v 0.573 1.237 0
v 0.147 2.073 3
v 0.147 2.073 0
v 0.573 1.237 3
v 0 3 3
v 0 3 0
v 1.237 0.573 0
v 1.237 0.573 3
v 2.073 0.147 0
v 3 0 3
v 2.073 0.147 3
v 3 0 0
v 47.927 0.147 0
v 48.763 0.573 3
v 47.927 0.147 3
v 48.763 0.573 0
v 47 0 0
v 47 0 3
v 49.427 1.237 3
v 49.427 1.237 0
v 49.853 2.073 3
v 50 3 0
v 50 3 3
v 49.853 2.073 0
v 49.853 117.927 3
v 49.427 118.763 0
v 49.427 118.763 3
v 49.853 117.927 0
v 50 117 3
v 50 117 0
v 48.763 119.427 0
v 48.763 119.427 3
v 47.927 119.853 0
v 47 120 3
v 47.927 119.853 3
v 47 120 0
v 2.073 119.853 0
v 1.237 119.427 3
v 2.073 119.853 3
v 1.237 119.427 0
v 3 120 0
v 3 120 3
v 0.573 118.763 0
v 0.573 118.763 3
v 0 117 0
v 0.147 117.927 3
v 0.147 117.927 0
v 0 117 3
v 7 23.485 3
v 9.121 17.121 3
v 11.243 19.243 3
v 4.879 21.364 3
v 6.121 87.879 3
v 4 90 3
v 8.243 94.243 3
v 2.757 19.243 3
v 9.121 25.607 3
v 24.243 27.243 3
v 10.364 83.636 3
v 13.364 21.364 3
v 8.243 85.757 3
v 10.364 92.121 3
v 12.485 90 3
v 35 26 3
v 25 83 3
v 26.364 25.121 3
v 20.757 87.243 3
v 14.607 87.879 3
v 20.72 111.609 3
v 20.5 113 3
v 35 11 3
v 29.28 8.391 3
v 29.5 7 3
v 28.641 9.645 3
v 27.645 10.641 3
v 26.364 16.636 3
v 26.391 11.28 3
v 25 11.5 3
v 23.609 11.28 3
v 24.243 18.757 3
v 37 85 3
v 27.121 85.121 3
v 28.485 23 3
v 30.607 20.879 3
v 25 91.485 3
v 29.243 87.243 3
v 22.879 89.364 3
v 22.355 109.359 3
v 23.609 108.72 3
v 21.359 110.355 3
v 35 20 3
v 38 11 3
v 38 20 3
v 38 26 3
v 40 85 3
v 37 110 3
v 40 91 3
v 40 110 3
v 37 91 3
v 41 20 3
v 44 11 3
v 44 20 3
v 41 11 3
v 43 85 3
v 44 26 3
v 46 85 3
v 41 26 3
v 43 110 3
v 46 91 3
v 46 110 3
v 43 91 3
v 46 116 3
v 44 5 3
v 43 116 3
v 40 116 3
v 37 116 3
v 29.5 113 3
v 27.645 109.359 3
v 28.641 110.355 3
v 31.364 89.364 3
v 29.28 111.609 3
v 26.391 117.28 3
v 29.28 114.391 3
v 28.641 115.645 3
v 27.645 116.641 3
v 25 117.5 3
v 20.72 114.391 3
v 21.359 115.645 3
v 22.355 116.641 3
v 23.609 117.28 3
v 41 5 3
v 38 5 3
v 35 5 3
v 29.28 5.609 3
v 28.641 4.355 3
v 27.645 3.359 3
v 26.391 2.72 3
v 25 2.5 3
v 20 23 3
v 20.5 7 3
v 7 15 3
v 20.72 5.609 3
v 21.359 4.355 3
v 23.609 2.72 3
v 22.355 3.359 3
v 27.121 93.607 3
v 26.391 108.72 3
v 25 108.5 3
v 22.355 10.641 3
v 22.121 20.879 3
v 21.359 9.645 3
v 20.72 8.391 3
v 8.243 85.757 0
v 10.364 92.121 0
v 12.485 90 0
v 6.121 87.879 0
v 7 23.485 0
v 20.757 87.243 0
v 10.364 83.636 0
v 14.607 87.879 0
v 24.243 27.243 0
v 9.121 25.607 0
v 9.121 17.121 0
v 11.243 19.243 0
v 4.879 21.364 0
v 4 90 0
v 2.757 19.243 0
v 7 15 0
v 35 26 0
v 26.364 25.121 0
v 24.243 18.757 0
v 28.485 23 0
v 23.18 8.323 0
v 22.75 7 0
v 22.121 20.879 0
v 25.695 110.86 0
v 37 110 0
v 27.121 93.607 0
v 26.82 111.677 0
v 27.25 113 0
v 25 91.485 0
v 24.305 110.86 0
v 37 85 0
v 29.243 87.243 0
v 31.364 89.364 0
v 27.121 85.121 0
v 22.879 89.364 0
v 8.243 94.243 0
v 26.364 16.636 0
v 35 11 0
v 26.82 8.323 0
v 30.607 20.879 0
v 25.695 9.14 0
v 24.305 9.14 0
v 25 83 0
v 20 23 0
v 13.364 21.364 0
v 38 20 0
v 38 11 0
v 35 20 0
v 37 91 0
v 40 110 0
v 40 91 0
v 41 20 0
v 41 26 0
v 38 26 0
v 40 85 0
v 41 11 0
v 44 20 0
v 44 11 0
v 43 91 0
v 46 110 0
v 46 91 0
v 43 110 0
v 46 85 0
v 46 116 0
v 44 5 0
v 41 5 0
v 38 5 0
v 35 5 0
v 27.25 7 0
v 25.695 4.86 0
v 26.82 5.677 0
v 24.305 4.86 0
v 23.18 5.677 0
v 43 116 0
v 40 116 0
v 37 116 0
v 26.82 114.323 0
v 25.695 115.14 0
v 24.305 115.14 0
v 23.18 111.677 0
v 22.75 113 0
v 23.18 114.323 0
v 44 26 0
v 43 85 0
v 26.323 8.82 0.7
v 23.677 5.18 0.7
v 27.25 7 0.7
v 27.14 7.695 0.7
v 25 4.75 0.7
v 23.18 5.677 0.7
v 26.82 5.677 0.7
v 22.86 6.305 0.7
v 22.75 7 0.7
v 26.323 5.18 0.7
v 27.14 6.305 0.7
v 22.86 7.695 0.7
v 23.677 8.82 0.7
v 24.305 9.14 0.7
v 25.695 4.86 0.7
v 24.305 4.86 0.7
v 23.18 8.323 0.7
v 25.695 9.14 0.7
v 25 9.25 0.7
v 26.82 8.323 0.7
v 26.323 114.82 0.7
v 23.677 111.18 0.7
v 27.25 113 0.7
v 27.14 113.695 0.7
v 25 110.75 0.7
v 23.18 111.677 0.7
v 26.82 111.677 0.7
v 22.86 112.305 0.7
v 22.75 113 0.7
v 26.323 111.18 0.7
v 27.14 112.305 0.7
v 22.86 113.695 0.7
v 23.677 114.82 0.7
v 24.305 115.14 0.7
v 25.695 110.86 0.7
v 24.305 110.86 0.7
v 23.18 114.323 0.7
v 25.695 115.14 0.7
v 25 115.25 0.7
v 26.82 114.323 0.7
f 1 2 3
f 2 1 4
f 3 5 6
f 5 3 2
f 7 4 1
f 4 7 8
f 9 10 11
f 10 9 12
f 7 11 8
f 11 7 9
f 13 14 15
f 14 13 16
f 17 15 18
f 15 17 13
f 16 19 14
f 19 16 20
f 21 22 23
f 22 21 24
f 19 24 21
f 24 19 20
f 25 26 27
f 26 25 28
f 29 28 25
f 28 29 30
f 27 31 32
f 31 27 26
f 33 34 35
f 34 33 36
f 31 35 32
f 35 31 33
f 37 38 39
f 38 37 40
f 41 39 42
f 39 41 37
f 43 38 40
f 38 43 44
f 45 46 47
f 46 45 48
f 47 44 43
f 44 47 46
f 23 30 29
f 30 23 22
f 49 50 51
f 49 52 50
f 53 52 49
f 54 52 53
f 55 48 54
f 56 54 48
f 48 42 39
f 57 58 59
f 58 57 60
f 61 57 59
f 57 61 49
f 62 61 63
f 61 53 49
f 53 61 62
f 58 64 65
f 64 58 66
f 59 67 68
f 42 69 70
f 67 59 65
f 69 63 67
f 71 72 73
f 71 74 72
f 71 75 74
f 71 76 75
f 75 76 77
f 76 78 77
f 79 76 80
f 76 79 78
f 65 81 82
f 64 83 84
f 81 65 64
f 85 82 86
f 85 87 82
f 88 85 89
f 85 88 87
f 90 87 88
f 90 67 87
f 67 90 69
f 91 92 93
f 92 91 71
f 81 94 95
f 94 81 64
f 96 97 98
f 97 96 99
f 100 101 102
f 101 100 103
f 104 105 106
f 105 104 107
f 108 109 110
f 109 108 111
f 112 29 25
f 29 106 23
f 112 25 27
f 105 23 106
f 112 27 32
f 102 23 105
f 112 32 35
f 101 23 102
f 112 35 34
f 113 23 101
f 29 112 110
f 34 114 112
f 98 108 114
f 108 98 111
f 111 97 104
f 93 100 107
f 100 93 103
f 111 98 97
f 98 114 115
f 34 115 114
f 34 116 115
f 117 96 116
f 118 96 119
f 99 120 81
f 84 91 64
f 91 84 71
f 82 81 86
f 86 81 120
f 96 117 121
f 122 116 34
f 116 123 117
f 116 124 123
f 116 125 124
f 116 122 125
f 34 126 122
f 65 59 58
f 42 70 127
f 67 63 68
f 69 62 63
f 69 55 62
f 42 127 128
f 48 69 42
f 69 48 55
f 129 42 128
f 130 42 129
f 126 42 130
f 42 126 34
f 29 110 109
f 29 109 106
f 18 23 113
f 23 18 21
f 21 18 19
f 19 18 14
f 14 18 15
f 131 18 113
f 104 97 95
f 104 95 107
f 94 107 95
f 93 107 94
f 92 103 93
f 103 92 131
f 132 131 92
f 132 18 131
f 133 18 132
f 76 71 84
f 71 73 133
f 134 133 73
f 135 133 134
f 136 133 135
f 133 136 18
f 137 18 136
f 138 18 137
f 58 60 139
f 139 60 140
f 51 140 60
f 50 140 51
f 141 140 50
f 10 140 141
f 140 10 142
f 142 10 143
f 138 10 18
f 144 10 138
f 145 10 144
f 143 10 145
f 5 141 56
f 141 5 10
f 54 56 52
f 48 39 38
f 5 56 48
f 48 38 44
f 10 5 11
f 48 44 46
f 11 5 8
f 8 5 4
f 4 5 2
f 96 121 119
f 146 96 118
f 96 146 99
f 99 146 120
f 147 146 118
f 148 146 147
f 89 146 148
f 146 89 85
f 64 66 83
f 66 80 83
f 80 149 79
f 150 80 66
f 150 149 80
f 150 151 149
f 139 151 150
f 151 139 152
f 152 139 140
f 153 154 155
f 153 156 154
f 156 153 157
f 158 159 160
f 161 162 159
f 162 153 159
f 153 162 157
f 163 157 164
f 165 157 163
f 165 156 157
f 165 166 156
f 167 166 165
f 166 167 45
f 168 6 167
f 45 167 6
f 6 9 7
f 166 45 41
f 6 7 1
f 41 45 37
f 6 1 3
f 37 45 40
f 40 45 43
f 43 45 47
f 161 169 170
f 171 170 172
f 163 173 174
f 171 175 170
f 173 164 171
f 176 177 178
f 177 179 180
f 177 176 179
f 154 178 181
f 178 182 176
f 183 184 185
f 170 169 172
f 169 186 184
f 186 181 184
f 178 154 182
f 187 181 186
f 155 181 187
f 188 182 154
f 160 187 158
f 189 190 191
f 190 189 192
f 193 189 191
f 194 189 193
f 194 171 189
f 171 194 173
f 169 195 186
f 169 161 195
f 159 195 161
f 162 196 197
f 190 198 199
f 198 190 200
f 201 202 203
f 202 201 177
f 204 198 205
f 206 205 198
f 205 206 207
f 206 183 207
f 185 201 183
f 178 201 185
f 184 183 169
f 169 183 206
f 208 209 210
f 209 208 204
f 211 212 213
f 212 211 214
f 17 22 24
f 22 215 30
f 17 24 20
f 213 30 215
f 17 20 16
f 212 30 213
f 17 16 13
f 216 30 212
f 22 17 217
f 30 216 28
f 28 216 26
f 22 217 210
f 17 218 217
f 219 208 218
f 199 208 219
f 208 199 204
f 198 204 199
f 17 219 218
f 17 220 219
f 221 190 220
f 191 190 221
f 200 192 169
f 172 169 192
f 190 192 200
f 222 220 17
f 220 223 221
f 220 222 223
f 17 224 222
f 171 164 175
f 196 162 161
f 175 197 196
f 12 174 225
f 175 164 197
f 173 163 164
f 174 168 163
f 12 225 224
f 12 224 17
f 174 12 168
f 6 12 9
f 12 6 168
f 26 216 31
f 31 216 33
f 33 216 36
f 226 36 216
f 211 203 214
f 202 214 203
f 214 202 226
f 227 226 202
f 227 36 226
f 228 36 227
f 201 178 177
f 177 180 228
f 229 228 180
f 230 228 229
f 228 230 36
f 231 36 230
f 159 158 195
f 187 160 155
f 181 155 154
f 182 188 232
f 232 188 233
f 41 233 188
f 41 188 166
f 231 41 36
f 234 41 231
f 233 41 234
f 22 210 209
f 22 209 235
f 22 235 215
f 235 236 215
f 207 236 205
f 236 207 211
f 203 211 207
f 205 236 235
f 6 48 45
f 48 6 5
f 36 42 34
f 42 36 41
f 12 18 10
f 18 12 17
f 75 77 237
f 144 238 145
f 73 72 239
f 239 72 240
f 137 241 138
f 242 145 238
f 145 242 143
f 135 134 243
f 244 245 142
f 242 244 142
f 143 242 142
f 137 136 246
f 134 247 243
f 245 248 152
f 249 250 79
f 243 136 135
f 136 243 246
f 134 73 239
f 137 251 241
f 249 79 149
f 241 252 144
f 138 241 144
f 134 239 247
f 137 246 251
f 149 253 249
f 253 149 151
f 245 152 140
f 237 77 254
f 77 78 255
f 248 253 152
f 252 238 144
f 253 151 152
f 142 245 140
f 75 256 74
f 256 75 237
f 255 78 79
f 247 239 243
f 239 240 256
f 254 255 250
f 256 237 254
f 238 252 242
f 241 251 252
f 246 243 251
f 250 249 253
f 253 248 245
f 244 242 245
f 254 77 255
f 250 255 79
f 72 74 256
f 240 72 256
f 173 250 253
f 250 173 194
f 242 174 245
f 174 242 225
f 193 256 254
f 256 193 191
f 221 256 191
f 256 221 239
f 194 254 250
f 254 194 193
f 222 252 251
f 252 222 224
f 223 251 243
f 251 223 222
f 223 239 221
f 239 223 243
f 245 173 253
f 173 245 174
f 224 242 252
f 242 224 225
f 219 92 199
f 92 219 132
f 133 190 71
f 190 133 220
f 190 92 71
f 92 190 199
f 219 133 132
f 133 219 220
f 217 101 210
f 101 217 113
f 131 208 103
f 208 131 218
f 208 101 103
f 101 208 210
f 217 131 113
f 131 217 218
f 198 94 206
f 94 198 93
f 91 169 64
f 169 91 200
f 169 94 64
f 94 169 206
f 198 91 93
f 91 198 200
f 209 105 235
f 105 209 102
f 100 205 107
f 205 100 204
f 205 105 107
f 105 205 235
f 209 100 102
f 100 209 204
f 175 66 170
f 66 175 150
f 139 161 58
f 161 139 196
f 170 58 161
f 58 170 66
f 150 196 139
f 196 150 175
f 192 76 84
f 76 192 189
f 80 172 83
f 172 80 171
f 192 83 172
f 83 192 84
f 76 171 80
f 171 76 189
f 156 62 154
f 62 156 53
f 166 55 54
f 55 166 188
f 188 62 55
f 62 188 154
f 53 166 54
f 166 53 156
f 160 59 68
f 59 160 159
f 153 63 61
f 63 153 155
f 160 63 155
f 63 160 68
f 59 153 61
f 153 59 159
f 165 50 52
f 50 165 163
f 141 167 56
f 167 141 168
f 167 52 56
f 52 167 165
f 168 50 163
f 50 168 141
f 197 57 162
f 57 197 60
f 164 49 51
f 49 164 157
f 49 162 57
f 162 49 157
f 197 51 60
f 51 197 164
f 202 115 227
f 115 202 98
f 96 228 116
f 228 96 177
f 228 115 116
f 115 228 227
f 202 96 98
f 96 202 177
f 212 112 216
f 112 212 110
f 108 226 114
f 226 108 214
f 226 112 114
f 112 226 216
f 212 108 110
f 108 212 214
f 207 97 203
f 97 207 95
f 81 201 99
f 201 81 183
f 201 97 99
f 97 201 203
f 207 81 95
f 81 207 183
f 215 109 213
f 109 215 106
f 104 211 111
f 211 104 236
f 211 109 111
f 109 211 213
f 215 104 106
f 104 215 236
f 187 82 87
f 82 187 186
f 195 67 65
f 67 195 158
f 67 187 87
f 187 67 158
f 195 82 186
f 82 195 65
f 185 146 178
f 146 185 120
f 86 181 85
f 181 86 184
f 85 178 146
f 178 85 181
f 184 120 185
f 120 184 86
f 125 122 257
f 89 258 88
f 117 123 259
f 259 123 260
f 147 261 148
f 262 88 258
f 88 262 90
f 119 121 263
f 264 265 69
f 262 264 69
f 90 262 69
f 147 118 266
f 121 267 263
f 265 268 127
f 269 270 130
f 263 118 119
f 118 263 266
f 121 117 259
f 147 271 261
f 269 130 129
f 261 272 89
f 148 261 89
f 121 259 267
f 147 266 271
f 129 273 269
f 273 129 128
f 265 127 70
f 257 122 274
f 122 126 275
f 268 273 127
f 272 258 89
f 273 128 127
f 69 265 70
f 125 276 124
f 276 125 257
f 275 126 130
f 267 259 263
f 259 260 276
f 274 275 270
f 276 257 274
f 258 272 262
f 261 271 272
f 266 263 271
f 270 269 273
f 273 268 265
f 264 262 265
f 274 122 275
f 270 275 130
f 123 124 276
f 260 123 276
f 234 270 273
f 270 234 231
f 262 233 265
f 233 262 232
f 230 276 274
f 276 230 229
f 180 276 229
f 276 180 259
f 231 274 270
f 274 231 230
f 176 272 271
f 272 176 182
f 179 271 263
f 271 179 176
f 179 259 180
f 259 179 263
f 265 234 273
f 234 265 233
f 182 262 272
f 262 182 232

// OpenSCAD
// file: modules/RoundedCube.scad
$fn = 20;

module roundedsquare(x=20, y=20, z=20, radius=3) {
	difference(){
		cube([x,y,z]);
		translate([0,0,0]) rotate([0,0,0]) fillet(radius,z);
		translate([x,0,0]) rotate([0,0,90]) fillet(radius,z);
		translate([x,y,0]) rotate([0,0,180]) fillet(radius,z);
		translate([0,y,0]) rotate([0,0,270]) fillet(radius,z);	
	}
}

module roundedcube(x=20, y=20, z=20, radius=3) {
	difference(){
		cube([x,y,z]);
		// fillet along z axis
		translate([0,0,0]) rotate([0,0,0]) fillet(radius,z);
		translate([x,0,0]) rotate([0,0,90]) fillet(radius,z);
		translate([x,y,0]) rotate([0,0,180]) fillet(radius,z);
		translate([0,y,0]) rotate([0,0,270]) fillet(radius,z);
		// fillet along x axis
		translate([0,0,0]) rotate([90,0,90]) fillet(radius,z);
		translate([0,0,z]) rotate([90,90,90]) fillet(radius,z);
		translate([0,y,z]) rotate([90,180,90]) fillet(radius,z);
		translate([0,y,0]) rotate([90,270,90]) fillet(radius,z);
		// fillet along y axis
		translate([0,0,0]) rotate([-90,270,0]) fillet(radius,z);
		translate([x,0,0]) rotate([-90,180,0]) fillet(radius,z);
		translate([x,0,z]) rotate([-90,90,0]) fillet(radius,z);
		translate([0,0,z]) rotate([-90,0,0]) fillet(radius,z);
	}
}

module fillet(radius = 1, height = 1){
    translate([radius, radius, -1]) rotate([0,0,180])
        difference(){
            cube([radius + 1, radius + 1, height + 2]);
            cylinder(r = radius, h = height + 2);
        }
}

//roundedsquare();
// main file
/*
 * LED Relay Board & PS mount
 *
 120mm tall
 50mm wide
 4mm thick
 
 screw holes at top and bottom
 zip tie holes for each wire
 
 
*/

include <modules/RoundedCube.scad>

plateWidth = 50;
plateHeight = 120;
plateThick = 3;
plateCorner = 3;

difference(){
	roundedsquare(x=plateWidth, y=plateHeight, z=plateThick, radius=plateCorner);
	//Bottom holes
	#translate([plateWidth/2,7,plateThick]) screwHole();
	#translate([35,5,0]) ziptie();
	#translate([35,20,0]) ziptie();
	#translate([20,23,0]) rotate([0,0,-45]) ziptie();
	#translate([4,90,0]) rotate([0,0,-45]) ziptie();	
	//Top holes
	#translate([7,15,0]) rotate([0,0,45]) ziptie();	
	#translate([37,110,0]) ziptie();
	#translate([37,85,0]) ziptie();
	#translate([25,83,0]) rotate([0,0,45]) ziptie();
	#translate([plateWidth/2,113,plateThick]) screwHole();
	//	#translate([plateWidth-20,plateHeight-15,0]) ziptie();
	//	#translate([plateWidth-35,plateHeight-15,0]) ziptie();
	//	#translate([plateWidth-60,plateHeight-15,0]) ziptie();
	//	#translate([plateWidth-80,plateHeight-15,0]) ziptie();
    //#translate([piHoleStartX+piHoleX+40,piHoleStartY,0]) rotate(90,0,0) ziptie();

  //#translate([ZipX,ZipY2,0]) rotate(90,0,0) ziptie();
}


module ziptie(){
    zipWidth = 3;
    zipHeight = 6;
    zipSpace = 6;
    zipDepth = 1;
    // Bottom groove
    //#translate ([0,0,0]) cube([zipWidth+zipSpace,zipHeight,zipDepth]);
    // Left ziptie slot
    #translate([0,0,0]) cube([zipWidth,zipHeight,plateThick+1]);
    // Right ziptie slot
    #translate([zipSpace,0,0]) cube([zipWidth,zipHeight,plateThick+1]);
    // Bottom
}

module screwHole(){
    screwHole = 4.5;
    screwDepth = 10;
    screwHead = 9;
    headTaper = 2.3;
    screwHeadDepth = 5;
    translate([0,0,-headTaper])cylinder(d1=screwHole, d2=screwHead, h = headTaper, $fn=20);
    translate([0,0,-headTaper-screwDepth])cylinder(d=screwHole, h=screwDepth, $fn=10);
    translate([0,0,-headTaper-screwDepth])cylinder(d=screwHole, h=screwDepth, $fn=10);
    translate([0,0,0]) cylinder(d=screwHead, h=screwHeadDepth, $fn=10);
}
